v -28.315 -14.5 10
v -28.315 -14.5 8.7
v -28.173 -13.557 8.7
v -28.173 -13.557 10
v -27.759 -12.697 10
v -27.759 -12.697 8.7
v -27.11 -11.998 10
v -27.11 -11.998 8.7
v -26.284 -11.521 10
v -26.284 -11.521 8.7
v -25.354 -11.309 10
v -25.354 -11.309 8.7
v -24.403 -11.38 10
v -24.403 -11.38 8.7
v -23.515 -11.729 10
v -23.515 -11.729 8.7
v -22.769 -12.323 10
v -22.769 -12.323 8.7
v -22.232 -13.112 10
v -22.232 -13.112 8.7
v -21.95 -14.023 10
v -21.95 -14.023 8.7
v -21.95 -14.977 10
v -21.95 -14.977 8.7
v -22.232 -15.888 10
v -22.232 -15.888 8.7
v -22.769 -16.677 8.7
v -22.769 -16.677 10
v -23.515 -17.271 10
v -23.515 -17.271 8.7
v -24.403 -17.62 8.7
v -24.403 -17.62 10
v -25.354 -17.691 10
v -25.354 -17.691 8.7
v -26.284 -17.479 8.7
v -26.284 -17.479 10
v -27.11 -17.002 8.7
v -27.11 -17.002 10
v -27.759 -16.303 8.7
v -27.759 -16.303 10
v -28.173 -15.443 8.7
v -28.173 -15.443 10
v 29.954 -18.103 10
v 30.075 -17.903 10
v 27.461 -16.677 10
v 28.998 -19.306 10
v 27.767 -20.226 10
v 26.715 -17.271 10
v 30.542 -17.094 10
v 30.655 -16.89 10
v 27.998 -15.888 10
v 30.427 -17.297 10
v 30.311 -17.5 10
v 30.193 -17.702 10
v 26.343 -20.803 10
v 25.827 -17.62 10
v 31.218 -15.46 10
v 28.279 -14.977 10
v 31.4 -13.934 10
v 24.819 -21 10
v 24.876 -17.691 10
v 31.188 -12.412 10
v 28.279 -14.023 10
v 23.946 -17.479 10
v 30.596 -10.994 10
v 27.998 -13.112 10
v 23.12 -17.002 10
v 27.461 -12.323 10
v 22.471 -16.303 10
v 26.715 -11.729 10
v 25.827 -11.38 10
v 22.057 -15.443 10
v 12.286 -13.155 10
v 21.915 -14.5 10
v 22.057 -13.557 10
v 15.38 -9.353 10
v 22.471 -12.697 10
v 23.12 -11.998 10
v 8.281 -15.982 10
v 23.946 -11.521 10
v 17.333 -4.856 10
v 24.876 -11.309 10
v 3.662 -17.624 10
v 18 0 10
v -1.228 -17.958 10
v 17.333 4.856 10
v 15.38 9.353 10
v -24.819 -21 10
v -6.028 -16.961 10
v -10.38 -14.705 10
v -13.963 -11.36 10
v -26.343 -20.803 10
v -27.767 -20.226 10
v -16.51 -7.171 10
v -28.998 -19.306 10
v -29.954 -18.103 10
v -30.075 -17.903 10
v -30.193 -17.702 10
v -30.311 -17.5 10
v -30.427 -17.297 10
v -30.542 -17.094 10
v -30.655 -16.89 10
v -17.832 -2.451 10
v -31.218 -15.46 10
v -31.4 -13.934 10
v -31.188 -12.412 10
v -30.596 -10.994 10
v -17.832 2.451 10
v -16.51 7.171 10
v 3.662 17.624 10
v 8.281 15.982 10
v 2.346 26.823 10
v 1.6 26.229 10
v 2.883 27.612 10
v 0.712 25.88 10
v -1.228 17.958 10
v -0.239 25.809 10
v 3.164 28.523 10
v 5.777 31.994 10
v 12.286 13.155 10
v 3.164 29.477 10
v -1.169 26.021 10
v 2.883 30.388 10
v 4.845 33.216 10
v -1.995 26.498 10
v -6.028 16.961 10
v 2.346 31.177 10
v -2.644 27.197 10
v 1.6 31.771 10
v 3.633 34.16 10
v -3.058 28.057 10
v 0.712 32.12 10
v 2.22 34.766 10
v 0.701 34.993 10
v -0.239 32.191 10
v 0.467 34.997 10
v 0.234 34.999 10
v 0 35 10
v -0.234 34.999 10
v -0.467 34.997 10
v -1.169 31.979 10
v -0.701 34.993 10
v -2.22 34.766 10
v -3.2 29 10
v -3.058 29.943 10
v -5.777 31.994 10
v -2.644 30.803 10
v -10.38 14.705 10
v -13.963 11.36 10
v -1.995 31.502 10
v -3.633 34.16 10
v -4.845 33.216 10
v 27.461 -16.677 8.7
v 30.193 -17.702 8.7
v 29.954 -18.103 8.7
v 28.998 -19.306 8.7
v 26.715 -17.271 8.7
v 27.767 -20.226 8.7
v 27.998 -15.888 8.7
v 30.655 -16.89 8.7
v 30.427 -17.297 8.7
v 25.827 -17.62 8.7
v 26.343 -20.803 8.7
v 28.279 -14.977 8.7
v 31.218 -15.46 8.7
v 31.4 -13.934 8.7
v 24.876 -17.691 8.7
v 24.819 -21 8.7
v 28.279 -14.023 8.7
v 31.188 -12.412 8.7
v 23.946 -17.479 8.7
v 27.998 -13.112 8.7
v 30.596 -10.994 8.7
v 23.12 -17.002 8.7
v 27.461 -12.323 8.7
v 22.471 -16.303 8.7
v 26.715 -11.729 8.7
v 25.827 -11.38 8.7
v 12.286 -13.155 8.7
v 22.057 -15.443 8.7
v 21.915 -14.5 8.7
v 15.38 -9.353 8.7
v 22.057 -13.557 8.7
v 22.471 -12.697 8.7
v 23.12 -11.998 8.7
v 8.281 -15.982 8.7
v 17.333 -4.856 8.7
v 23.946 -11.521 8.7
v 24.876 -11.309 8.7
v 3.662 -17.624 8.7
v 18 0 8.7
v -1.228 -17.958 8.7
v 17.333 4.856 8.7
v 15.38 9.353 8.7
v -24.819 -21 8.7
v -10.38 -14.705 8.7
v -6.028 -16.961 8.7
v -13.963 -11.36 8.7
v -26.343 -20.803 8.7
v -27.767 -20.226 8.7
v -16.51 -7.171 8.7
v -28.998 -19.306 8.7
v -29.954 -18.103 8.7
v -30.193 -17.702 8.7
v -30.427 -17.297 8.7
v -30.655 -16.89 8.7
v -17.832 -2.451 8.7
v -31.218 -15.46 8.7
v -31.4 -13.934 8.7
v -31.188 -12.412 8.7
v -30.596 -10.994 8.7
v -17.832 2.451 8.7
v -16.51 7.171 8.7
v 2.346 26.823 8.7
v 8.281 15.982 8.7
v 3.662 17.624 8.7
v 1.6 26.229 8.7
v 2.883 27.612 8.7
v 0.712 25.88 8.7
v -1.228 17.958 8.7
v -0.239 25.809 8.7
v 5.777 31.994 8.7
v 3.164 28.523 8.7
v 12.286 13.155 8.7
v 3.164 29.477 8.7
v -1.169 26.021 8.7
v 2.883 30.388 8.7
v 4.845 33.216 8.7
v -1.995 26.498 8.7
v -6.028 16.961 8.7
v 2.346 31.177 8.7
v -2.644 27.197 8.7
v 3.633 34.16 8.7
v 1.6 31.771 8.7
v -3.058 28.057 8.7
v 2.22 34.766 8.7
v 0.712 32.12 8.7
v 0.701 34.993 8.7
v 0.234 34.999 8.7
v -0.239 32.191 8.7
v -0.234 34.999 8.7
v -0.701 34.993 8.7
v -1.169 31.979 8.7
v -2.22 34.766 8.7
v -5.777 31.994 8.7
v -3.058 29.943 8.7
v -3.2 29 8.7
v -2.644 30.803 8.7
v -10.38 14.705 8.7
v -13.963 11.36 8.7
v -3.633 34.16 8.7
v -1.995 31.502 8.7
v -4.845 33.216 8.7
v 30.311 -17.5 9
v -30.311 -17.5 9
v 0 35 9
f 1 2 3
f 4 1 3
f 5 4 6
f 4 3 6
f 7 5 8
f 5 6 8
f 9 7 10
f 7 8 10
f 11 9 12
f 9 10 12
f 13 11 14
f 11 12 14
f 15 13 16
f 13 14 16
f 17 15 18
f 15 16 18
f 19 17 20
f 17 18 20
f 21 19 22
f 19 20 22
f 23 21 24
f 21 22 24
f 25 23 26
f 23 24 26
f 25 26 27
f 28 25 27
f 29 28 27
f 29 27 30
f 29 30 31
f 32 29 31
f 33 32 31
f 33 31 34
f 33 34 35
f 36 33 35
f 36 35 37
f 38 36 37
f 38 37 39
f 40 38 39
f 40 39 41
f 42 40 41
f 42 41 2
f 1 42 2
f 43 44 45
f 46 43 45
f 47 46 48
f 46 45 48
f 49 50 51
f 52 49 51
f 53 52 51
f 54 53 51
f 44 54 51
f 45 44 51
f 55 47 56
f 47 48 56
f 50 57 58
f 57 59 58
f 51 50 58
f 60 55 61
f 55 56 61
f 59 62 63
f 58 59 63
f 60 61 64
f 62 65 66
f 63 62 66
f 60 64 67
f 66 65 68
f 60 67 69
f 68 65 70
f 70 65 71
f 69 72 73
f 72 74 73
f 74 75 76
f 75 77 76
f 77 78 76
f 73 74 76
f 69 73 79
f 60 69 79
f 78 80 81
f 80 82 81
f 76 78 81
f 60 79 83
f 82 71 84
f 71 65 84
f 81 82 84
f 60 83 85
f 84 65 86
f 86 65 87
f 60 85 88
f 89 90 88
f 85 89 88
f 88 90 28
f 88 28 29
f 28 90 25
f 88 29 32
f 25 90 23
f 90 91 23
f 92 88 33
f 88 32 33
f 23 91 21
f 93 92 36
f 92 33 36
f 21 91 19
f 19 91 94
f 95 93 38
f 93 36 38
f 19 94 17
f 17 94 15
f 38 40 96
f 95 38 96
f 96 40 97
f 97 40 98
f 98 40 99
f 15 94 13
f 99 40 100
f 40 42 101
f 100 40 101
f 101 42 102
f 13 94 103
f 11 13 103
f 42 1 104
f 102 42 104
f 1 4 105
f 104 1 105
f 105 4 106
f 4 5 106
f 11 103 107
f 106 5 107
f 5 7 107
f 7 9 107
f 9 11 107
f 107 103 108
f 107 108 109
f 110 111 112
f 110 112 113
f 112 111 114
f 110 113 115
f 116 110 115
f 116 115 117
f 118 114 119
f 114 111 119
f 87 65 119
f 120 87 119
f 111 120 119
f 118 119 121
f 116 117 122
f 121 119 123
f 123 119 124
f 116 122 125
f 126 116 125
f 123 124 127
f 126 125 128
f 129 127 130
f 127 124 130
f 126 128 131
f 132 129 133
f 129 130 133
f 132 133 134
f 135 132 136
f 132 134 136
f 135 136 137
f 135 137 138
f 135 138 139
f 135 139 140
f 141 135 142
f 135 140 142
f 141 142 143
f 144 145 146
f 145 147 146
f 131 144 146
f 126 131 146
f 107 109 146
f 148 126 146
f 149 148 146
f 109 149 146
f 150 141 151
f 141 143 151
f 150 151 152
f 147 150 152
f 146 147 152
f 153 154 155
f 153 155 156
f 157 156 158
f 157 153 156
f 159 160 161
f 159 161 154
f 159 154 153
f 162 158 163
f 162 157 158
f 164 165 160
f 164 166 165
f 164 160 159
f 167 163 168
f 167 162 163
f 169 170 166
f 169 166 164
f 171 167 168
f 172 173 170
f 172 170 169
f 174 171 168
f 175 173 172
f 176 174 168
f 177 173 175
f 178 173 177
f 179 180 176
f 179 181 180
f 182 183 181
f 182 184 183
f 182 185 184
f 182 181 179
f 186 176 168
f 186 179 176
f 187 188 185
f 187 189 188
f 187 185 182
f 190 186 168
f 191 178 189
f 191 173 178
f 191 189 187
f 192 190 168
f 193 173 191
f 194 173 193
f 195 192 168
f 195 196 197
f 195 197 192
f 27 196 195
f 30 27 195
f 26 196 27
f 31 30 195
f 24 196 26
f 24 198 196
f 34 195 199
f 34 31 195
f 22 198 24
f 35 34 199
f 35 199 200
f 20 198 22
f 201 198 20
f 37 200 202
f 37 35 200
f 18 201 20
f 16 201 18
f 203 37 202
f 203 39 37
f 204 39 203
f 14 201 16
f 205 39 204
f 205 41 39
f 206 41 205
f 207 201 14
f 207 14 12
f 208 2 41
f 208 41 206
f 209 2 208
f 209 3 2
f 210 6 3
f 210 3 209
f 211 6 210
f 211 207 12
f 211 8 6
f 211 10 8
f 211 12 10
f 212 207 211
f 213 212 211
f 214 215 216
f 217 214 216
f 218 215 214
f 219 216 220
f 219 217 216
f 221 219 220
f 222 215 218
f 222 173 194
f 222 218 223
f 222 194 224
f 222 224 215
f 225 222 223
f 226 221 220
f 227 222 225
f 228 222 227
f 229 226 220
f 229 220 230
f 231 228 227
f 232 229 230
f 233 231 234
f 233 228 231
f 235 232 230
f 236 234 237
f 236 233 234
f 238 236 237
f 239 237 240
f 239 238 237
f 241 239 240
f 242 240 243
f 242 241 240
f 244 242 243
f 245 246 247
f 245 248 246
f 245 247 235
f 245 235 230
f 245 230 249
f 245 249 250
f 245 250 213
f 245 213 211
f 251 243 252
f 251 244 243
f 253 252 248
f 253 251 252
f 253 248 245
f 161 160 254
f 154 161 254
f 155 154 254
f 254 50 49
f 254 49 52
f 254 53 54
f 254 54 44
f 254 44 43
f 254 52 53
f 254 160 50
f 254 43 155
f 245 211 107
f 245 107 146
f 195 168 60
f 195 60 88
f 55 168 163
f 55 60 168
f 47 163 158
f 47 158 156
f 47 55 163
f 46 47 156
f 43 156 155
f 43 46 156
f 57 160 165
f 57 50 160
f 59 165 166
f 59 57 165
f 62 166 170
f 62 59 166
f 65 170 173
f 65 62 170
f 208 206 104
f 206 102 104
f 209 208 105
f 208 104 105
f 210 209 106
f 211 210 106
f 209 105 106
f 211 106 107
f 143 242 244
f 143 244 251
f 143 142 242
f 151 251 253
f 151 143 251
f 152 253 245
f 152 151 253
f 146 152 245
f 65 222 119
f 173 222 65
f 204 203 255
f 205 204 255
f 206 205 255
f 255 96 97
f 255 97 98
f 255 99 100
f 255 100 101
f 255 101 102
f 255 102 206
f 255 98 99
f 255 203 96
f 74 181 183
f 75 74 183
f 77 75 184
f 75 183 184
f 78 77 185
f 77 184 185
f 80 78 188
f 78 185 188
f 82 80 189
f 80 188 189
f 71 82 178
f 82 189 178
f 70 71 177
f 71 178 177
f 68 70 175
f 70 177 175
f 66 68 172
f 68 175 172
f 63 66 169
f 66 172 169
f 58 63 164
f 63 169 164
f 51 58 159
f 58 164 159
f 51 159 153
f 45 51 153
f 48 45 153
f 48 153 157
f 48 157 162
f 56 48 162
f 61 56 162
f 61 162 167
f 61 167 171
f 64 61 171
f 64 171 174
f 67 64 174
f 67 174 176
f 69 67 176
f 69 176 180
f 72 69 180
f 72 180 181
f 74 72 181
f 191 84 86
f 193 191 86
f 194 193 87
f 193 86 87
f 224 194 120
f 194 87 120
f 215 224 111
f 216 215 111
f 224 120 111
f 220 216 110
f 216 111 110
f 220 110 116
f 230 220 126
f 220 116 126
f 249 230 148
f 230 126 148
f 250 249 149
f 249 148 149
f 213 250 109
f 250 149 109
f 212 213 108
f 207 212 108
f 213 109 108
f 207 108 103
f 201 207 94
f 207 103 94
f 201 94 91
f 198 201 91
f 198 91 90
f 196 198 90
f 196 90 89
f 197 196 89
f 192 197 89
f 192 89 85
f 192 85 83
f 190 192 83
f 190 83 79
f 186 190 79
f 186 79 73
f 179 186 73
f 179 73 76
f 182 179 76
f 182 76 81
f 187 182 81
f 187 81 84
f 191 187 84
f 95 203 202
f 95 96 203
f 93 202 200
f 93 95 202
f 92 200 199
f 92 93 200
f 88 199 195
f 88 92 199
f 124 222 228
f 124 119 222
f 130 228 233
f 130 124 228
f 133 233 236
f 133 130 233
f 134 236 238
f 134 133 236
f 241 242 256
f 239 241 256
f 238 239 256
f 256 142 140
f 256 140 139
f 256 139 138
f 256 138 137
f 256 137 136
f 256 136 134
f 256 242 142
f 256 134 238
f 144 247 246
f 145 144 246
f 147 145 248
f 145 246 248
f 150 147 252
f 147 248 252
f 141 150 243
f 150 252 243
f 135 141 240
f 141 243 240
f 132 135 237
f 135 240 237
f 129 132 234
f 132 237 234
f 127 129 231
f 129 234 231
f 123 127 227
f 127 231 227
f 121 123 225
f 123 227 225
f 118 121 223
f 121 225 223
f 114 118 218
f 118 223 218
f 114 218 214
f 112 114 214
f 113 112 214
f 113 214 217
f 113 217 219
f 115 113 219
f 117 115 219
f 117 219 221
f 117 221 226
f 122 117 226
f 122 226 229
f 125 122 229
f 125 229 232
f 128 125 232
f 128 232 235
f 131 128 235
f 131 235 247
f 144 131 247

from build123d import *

# Parameters (mm, degrees)
SKETCH2_R           = 18
BOSS_EXTRUDE1_DEPTH = 1.3
BOSS_EXTRUDE7_START = -1.3
BOSS_EXTRUDE7_DEPTH = 1.3
SKETCH17_R          = 0.7
BOSS_EXTRUDE9_DEPTH = 1.3
BOSS_EXTRUDE2_START = -1.3
SKETCH3_R           = 35
SKETCH3_R_2         = 18
BOSS_EXTRUDE2_DEPTH = 1.3
SKETCH6_R           = 5
BOSS_EXTRUDE4_DEPTH = 1
SKETCH7_R           = 59.131365533
CUT_EXTRUDE1_DEPTH  = 10
FILLET1_R           = 6
SKETCH4_R           = 3.2
CUT_EXTRUDE2_DEPTH  = 10
SKETCH18_R          = 18
CUT_EXTRUDE3_DEPTH  = 10


with BuildPart() as part:
    # Sketch2 → Boss-Extrude1 (new body)
    with BuildSketch(Plane.XY.offset(10)):
        Circle(SKETCH2_R)
        with BuildLine():
            ThreePointArc((0, 0.538550206), (0.166421166, 0.512191682), (0.316551869, 0.435696269))
            Line((0.316551869, 0.435696269), (9.992349289, 13.753288904))
            ThreePointArc((9.992349289, 13.753288904), (13.753288904, 9.992349289), (16.167960777, 5.253288904))
            Line((16.167960777, 5.253288904), (0.512191682, 0.166421166))
            ThreePointArc((0.512191682, 0.166421166), (0.538550206, 0), (0.512191682, -0.166421166))
            Line((0.512191682, -0.166421166), (16.167960777, -5.253288904))
            ThreePointArc((16.167960777, -5.253288904), (13.753288904, -9.992349289), (9.992349289, -13.753288904))
            Line((9.992349289, -13.753288904), (0.316551869, -0.435696269))
            ThreePointArc((0.316551869, -0.435696269), (0.166421166, -0.512191682), (0, -0.538550206))
            Line((0, -0.538550206), (0, -17))
            ThreePointArc((0, -17), (-5.253288904, -16.167960777), (-9.992349289, -13.753288904))
            Line((-9.992349289, -13.753288904), (-0.316551869, -0.435696269))
            ThreePointArc((-0.316551869, -0.435696269), (-0.435696269, -0.316551869), (-0.512191682, -0.166421166))
            Line((-0.512191682, -0.166421166), (-16.167960777, -5.253288904))
            ThreePointArc((-16.167960777, -5.253288904), (-17, 0), (-16.167960777, 5.253288904))
            Line((-16.167960777, 5.253288904), (-0.512191682, 0.166421166))
            ThreePointArc((-0.512191682, 0.166421166), (-0.435696269, 0.316551869), (-0.316551869, 0.435696269))
            Line((-0.316551869, 0.435696269), (-9.992349289, 13.753288904))
            ThreePointArc((-9.992349289, 13.753288904), (-5.253288904, 16.167960777), (0, 17))
            Line((0, 17), (0, 0.538550206))
        make_face(mode=Mode.SUBTRACT)
        with BuildLine():
            Line((0.5, 1.198581445), (0.5, 16.492422502))
            ThreePointArc((0.5, 16.492422502), (5.193820321, 15.661233364), (9.454148381, 13.522909391))
            Line((9.454148381, 13.522909391), (0.5, 1.198581445))
        make_face(mode=Mode.SUBTRACT)
        with BuildLine():
            Line((-9.939558578, 13.170238239), (-0.985410197, 0.845910294))
            Line((-0.985410197, 0.845910294), (-15.530717393, 5.57196709))
            ThreePointArc((-15.530717393, 5.57196709), (-13.289739299, 9.779203923), (-9.939558578, 13.170238239))
        make_face(mode=Mode.SUBTRACT)
        with BuildLine():
            Line((-15.597133416, -5.383254519), (-1.109016994, -0.675780132))
            Line((-1.109016994, -0.675780132), (-10.098511219, -13.048757457))
            ThreePointArc((-10.098511219, -13.048757457), (-13.40733091, -9.617352956), (-15.597133416, -5.383254519))
        make_face(mode=Mode.SUBTRACT)
        with BuildLine():
            ThreePointArc((9.289494224, -13.636542709), (5.003553098, -15.723054932), (0.3, -16.497272502))
            Line((0.3, -16.497272502), (0.3, -1.263565384))
            Line((0.3, -1.263565384), (9.289494224, -13.636542709))
        make_face(mode=Mode.SUBTRACT)
        with BuildLine():
            Line((15.782543612, -4.812620609), (1.294427191, -0.105146222))
            Line((1.294427191, -0.105146222), (15.839734388, 4.620910574))
            ThreePointArc((15.839734388, 4.620910574), (16.499696789, -0.100029399), (15.782543612, -4.812620609))
        make_face(mode=Mode.SUBTRACT)
    extrude(amount=-BOSS_EXTRUDE1_DEPTH)

    # Sketch11 → Boss-Extrude7 (add)
    with BuildSketch(Plane(origin=(0, 0, 8.7), x_dir=(-1, 0, 0), z_dir=(0, 0, -1)).offset(BOSS_EXTRUDE7_START)):
        with BuildLine():
            ThreePointArc((-0.512191682, 0.166421166), (-0.435696269, 0.316551869), (-0.316551869, 0.435696269))
            Line((-0.316551869, 0.435696269), (-9.992349289, 13.753288904))
            ThreePointArc((-9.992349289, 13.753288904), (-13.753288904, 9.992349289), (-16.167960777, 5.253288904))
            Line((-16.167960777, 5.253288904), (-0.512191682, 0.166421166))
        make_face()
        with BuildLine():
            Line((0, 17), (0, 0.538550206))
            ThreePointArc((0, 0.538550206), (0.166421166, 0.512191682), (0.316551869, 0.435696269))
            Line((0.316551869, 0.435696269), (9.992349289, 13.753288904))
            ThreePointArc((9.992349289, 13.753288904), (5.253288904, 16.167960777), (0, 17))
        make_face()
        with BuildLine():
            Line((16.167960777, 5.253288904), (0.512191682, 0.166421166))
            ThreePointArc((0.512191682, 0.166421166), (0.531919759, 0.084247813), (0.538550206, 0))
            ThreePointArc((0.538550206, 0), (0.531919759, -0.084247813), (0.512191682, -0.166421166))
            Line((0.512191682, -0.166421166), (16.167960777, -5.253288904))
            ThreePointArc((16.167960777, -5.253288904), (17, 0), (16.167960777, 5.253288904))
        make_face()
        with BuildLine():
            Line((9.992349289, -13.753288904), (0.316551869, -0.435696269))
            ThreePointArc((0.316551869, -0.435696269), (0.166421166, -0.512191682), (0, -0.538550206))
            Line((0, -0.538550206), (0, -17))
            ThreePointArc((0, -17), (5.253288904, -16.167960777), (9.992349289, -13.753288904))
        make_face()
        with BuildLine():
            ThreePointArc((-0.316551869, -0.435696269), (-0.435696269, -0.316551869), (-0.512191682, -0.166421166))
            Line((-0.512191682, -0.166421166), (-16.167960777, -5.253288904))
            ThreePointArc((-16.167960777, -5.253288904), (-13.753288904, -9.992349289), (-9.992349289, -13.753288904))
            Line((-9.992349289, -13.753288904), (-0.316551869, -0.435696269))
        make_face()
        with BuildLine():
            ThreePointArc((0.316551869, 0.435696269), (0.166421166, 0.512191682), (0, 0.538550206))
            ThreePointArc((0, 0.538550206), (-0.166421166, 0.512191682), (-0.316551869, 0.435696269))
            ThreePointArc((-0.316551869, 0.435696269), (-0.435696269, 0.316551869), (-0.512191682, 0.166421166))
            ThreePointArc((-0.512191682, 0.166421166), (-0.538550206, 0), (-0.512191682, -0.166421166))
            ThreePointArc((-0.512191682, -0.166421166), (-0.435696269, -0.316551869), (-0.316551869, -0.435696269))
            ThreePointArc((-0.316551869, -0.435696269), (-0.166421166, -0.512191682), (0, -0.538550206))
            ThreePointArc((0, -0.538550206), (0.166421166, -0.512191682), (0.316551869, -0.435696269))
            ThreePointArc((0.316551869, -0.435696269), (0.435696269, -0.316551869), (0.512191682, -0.166421166))
            ThreePointArc((0.512191682, -0.166421166), (0.531919759, -0.084247813), (0.538550206, 0))
            ThreePointArc((0.538550206, 0), (0.531919759, 0.084247813), (0.512191682, 0.166421166))
            ThreePointArc((0.512191682, 0.166421166), (0.435696269, 0.316551869), (0.316551869, 0.435696269))
        make_face()
    extrude(amount=BOSS_EXTRUDE7_DEPTH)

    # Sketch17 → Boss-Extrude9 (add)
    with BuildSketch(Plane(origin=(0, 0, 8.7), x_dir=(-1, 0, 0), z_dir=(0, 0, -1))):
        Circle(SKETCH17_R)
    extrude(amount=-BOSS_EXTRUDE9_DEPTH)

    # Sketch3 → Boss-Extrude2 (add)
    with BuildSketch(Plane(origin=(0, 0, 8.7), x_dir=(-1, 0, 0), z_dir=(0, 0, -1)).offset(BOSS_EXTRUDE2_START)):
        Circle(SKETCH3_R)
        Circle(SKETCH3_R_2, mode=Mode.SUBTRACT)
    extrude(amount=BOSS_EXTRUDE2_DEPTH)

    # Sketch6 → Boss-Extrude4 (add)
    with BuildSketch(Plane(origin=(0, 0, 10), x_dir=(-1, 0, 0), z_dir=(0, 0, -1))):
        with Locations((0, 30)):
            Circle(SKETCH6_R)
        with Locations((25.980762114, -15)):
            Circle(SKETCH6_R)
        with Locations((-25.980762114, -15)):
            Circle(SKETCH6_R)
    extrude(amount=BOSS_EXTRUDE4_DEPTH)

    # Sketch7 → Cut-Extrude1 (cut)
    with BuildSketch(Plane(origin=(0, 0, 8.7), x_dir=(-1, 0, 0), z_dir=(0, 0, -1))):
        Circle(SKETCH7_R)
        Polygon((0, 42), (-36.373066959, -21), (36.373066959, -21), align=None, mode=Mode.SUBTRACT)
    extrude(amount=-CUT_EXTRUDE1_DEPTH, mode=Mode.SUBTRACT)

    # Fillet1
    fillet1_edges = [part.edges().sort_by_distance(p)[0] for p in [
        (4.186533479, 34.748711306, 9.35),
        (32.186533479, -13.748711306, 9.35),
        (28, -21, 9.35),
        (-28, -21, 9.35),
        (-32.186533479, -13.748711306, 9.35),
        (-4.186533479, 34.748711306, 9.35),
    ]]
    fillet(fillet1_edges, radius=FILLET1_R)

    # Sketch4 → Cut-Extrude2 (cut)
    with BuildSketch(Plane(origin=(0, 0, 8.7), x_dir=(-1, 0, 0), z_dir=(0, 0, -1))):
        with Locations((0, 29)):
            Circle(SKETCH4_R)
        with Locations((25.11473671, -14.5)):
            Circle(SKETCH4_R)
        with Locations((-25.11473671, -14.5)):
            Circle(SKETCH4_R)
    extrude(amount=-CUT_EXTRUDE2_DEPTH, mode=Mode.SUBTRACT)

    # Sketch18 → Cut-Extrude3 (cut)
    with BuildSketch(Plane.XY.offset(10)):
        Circle(SKETCH18_R)
    extrude(amount=-CUT_EXTRUDE3_DEPTH, mode=Mode.SUBTRACT)


solid = part.part
